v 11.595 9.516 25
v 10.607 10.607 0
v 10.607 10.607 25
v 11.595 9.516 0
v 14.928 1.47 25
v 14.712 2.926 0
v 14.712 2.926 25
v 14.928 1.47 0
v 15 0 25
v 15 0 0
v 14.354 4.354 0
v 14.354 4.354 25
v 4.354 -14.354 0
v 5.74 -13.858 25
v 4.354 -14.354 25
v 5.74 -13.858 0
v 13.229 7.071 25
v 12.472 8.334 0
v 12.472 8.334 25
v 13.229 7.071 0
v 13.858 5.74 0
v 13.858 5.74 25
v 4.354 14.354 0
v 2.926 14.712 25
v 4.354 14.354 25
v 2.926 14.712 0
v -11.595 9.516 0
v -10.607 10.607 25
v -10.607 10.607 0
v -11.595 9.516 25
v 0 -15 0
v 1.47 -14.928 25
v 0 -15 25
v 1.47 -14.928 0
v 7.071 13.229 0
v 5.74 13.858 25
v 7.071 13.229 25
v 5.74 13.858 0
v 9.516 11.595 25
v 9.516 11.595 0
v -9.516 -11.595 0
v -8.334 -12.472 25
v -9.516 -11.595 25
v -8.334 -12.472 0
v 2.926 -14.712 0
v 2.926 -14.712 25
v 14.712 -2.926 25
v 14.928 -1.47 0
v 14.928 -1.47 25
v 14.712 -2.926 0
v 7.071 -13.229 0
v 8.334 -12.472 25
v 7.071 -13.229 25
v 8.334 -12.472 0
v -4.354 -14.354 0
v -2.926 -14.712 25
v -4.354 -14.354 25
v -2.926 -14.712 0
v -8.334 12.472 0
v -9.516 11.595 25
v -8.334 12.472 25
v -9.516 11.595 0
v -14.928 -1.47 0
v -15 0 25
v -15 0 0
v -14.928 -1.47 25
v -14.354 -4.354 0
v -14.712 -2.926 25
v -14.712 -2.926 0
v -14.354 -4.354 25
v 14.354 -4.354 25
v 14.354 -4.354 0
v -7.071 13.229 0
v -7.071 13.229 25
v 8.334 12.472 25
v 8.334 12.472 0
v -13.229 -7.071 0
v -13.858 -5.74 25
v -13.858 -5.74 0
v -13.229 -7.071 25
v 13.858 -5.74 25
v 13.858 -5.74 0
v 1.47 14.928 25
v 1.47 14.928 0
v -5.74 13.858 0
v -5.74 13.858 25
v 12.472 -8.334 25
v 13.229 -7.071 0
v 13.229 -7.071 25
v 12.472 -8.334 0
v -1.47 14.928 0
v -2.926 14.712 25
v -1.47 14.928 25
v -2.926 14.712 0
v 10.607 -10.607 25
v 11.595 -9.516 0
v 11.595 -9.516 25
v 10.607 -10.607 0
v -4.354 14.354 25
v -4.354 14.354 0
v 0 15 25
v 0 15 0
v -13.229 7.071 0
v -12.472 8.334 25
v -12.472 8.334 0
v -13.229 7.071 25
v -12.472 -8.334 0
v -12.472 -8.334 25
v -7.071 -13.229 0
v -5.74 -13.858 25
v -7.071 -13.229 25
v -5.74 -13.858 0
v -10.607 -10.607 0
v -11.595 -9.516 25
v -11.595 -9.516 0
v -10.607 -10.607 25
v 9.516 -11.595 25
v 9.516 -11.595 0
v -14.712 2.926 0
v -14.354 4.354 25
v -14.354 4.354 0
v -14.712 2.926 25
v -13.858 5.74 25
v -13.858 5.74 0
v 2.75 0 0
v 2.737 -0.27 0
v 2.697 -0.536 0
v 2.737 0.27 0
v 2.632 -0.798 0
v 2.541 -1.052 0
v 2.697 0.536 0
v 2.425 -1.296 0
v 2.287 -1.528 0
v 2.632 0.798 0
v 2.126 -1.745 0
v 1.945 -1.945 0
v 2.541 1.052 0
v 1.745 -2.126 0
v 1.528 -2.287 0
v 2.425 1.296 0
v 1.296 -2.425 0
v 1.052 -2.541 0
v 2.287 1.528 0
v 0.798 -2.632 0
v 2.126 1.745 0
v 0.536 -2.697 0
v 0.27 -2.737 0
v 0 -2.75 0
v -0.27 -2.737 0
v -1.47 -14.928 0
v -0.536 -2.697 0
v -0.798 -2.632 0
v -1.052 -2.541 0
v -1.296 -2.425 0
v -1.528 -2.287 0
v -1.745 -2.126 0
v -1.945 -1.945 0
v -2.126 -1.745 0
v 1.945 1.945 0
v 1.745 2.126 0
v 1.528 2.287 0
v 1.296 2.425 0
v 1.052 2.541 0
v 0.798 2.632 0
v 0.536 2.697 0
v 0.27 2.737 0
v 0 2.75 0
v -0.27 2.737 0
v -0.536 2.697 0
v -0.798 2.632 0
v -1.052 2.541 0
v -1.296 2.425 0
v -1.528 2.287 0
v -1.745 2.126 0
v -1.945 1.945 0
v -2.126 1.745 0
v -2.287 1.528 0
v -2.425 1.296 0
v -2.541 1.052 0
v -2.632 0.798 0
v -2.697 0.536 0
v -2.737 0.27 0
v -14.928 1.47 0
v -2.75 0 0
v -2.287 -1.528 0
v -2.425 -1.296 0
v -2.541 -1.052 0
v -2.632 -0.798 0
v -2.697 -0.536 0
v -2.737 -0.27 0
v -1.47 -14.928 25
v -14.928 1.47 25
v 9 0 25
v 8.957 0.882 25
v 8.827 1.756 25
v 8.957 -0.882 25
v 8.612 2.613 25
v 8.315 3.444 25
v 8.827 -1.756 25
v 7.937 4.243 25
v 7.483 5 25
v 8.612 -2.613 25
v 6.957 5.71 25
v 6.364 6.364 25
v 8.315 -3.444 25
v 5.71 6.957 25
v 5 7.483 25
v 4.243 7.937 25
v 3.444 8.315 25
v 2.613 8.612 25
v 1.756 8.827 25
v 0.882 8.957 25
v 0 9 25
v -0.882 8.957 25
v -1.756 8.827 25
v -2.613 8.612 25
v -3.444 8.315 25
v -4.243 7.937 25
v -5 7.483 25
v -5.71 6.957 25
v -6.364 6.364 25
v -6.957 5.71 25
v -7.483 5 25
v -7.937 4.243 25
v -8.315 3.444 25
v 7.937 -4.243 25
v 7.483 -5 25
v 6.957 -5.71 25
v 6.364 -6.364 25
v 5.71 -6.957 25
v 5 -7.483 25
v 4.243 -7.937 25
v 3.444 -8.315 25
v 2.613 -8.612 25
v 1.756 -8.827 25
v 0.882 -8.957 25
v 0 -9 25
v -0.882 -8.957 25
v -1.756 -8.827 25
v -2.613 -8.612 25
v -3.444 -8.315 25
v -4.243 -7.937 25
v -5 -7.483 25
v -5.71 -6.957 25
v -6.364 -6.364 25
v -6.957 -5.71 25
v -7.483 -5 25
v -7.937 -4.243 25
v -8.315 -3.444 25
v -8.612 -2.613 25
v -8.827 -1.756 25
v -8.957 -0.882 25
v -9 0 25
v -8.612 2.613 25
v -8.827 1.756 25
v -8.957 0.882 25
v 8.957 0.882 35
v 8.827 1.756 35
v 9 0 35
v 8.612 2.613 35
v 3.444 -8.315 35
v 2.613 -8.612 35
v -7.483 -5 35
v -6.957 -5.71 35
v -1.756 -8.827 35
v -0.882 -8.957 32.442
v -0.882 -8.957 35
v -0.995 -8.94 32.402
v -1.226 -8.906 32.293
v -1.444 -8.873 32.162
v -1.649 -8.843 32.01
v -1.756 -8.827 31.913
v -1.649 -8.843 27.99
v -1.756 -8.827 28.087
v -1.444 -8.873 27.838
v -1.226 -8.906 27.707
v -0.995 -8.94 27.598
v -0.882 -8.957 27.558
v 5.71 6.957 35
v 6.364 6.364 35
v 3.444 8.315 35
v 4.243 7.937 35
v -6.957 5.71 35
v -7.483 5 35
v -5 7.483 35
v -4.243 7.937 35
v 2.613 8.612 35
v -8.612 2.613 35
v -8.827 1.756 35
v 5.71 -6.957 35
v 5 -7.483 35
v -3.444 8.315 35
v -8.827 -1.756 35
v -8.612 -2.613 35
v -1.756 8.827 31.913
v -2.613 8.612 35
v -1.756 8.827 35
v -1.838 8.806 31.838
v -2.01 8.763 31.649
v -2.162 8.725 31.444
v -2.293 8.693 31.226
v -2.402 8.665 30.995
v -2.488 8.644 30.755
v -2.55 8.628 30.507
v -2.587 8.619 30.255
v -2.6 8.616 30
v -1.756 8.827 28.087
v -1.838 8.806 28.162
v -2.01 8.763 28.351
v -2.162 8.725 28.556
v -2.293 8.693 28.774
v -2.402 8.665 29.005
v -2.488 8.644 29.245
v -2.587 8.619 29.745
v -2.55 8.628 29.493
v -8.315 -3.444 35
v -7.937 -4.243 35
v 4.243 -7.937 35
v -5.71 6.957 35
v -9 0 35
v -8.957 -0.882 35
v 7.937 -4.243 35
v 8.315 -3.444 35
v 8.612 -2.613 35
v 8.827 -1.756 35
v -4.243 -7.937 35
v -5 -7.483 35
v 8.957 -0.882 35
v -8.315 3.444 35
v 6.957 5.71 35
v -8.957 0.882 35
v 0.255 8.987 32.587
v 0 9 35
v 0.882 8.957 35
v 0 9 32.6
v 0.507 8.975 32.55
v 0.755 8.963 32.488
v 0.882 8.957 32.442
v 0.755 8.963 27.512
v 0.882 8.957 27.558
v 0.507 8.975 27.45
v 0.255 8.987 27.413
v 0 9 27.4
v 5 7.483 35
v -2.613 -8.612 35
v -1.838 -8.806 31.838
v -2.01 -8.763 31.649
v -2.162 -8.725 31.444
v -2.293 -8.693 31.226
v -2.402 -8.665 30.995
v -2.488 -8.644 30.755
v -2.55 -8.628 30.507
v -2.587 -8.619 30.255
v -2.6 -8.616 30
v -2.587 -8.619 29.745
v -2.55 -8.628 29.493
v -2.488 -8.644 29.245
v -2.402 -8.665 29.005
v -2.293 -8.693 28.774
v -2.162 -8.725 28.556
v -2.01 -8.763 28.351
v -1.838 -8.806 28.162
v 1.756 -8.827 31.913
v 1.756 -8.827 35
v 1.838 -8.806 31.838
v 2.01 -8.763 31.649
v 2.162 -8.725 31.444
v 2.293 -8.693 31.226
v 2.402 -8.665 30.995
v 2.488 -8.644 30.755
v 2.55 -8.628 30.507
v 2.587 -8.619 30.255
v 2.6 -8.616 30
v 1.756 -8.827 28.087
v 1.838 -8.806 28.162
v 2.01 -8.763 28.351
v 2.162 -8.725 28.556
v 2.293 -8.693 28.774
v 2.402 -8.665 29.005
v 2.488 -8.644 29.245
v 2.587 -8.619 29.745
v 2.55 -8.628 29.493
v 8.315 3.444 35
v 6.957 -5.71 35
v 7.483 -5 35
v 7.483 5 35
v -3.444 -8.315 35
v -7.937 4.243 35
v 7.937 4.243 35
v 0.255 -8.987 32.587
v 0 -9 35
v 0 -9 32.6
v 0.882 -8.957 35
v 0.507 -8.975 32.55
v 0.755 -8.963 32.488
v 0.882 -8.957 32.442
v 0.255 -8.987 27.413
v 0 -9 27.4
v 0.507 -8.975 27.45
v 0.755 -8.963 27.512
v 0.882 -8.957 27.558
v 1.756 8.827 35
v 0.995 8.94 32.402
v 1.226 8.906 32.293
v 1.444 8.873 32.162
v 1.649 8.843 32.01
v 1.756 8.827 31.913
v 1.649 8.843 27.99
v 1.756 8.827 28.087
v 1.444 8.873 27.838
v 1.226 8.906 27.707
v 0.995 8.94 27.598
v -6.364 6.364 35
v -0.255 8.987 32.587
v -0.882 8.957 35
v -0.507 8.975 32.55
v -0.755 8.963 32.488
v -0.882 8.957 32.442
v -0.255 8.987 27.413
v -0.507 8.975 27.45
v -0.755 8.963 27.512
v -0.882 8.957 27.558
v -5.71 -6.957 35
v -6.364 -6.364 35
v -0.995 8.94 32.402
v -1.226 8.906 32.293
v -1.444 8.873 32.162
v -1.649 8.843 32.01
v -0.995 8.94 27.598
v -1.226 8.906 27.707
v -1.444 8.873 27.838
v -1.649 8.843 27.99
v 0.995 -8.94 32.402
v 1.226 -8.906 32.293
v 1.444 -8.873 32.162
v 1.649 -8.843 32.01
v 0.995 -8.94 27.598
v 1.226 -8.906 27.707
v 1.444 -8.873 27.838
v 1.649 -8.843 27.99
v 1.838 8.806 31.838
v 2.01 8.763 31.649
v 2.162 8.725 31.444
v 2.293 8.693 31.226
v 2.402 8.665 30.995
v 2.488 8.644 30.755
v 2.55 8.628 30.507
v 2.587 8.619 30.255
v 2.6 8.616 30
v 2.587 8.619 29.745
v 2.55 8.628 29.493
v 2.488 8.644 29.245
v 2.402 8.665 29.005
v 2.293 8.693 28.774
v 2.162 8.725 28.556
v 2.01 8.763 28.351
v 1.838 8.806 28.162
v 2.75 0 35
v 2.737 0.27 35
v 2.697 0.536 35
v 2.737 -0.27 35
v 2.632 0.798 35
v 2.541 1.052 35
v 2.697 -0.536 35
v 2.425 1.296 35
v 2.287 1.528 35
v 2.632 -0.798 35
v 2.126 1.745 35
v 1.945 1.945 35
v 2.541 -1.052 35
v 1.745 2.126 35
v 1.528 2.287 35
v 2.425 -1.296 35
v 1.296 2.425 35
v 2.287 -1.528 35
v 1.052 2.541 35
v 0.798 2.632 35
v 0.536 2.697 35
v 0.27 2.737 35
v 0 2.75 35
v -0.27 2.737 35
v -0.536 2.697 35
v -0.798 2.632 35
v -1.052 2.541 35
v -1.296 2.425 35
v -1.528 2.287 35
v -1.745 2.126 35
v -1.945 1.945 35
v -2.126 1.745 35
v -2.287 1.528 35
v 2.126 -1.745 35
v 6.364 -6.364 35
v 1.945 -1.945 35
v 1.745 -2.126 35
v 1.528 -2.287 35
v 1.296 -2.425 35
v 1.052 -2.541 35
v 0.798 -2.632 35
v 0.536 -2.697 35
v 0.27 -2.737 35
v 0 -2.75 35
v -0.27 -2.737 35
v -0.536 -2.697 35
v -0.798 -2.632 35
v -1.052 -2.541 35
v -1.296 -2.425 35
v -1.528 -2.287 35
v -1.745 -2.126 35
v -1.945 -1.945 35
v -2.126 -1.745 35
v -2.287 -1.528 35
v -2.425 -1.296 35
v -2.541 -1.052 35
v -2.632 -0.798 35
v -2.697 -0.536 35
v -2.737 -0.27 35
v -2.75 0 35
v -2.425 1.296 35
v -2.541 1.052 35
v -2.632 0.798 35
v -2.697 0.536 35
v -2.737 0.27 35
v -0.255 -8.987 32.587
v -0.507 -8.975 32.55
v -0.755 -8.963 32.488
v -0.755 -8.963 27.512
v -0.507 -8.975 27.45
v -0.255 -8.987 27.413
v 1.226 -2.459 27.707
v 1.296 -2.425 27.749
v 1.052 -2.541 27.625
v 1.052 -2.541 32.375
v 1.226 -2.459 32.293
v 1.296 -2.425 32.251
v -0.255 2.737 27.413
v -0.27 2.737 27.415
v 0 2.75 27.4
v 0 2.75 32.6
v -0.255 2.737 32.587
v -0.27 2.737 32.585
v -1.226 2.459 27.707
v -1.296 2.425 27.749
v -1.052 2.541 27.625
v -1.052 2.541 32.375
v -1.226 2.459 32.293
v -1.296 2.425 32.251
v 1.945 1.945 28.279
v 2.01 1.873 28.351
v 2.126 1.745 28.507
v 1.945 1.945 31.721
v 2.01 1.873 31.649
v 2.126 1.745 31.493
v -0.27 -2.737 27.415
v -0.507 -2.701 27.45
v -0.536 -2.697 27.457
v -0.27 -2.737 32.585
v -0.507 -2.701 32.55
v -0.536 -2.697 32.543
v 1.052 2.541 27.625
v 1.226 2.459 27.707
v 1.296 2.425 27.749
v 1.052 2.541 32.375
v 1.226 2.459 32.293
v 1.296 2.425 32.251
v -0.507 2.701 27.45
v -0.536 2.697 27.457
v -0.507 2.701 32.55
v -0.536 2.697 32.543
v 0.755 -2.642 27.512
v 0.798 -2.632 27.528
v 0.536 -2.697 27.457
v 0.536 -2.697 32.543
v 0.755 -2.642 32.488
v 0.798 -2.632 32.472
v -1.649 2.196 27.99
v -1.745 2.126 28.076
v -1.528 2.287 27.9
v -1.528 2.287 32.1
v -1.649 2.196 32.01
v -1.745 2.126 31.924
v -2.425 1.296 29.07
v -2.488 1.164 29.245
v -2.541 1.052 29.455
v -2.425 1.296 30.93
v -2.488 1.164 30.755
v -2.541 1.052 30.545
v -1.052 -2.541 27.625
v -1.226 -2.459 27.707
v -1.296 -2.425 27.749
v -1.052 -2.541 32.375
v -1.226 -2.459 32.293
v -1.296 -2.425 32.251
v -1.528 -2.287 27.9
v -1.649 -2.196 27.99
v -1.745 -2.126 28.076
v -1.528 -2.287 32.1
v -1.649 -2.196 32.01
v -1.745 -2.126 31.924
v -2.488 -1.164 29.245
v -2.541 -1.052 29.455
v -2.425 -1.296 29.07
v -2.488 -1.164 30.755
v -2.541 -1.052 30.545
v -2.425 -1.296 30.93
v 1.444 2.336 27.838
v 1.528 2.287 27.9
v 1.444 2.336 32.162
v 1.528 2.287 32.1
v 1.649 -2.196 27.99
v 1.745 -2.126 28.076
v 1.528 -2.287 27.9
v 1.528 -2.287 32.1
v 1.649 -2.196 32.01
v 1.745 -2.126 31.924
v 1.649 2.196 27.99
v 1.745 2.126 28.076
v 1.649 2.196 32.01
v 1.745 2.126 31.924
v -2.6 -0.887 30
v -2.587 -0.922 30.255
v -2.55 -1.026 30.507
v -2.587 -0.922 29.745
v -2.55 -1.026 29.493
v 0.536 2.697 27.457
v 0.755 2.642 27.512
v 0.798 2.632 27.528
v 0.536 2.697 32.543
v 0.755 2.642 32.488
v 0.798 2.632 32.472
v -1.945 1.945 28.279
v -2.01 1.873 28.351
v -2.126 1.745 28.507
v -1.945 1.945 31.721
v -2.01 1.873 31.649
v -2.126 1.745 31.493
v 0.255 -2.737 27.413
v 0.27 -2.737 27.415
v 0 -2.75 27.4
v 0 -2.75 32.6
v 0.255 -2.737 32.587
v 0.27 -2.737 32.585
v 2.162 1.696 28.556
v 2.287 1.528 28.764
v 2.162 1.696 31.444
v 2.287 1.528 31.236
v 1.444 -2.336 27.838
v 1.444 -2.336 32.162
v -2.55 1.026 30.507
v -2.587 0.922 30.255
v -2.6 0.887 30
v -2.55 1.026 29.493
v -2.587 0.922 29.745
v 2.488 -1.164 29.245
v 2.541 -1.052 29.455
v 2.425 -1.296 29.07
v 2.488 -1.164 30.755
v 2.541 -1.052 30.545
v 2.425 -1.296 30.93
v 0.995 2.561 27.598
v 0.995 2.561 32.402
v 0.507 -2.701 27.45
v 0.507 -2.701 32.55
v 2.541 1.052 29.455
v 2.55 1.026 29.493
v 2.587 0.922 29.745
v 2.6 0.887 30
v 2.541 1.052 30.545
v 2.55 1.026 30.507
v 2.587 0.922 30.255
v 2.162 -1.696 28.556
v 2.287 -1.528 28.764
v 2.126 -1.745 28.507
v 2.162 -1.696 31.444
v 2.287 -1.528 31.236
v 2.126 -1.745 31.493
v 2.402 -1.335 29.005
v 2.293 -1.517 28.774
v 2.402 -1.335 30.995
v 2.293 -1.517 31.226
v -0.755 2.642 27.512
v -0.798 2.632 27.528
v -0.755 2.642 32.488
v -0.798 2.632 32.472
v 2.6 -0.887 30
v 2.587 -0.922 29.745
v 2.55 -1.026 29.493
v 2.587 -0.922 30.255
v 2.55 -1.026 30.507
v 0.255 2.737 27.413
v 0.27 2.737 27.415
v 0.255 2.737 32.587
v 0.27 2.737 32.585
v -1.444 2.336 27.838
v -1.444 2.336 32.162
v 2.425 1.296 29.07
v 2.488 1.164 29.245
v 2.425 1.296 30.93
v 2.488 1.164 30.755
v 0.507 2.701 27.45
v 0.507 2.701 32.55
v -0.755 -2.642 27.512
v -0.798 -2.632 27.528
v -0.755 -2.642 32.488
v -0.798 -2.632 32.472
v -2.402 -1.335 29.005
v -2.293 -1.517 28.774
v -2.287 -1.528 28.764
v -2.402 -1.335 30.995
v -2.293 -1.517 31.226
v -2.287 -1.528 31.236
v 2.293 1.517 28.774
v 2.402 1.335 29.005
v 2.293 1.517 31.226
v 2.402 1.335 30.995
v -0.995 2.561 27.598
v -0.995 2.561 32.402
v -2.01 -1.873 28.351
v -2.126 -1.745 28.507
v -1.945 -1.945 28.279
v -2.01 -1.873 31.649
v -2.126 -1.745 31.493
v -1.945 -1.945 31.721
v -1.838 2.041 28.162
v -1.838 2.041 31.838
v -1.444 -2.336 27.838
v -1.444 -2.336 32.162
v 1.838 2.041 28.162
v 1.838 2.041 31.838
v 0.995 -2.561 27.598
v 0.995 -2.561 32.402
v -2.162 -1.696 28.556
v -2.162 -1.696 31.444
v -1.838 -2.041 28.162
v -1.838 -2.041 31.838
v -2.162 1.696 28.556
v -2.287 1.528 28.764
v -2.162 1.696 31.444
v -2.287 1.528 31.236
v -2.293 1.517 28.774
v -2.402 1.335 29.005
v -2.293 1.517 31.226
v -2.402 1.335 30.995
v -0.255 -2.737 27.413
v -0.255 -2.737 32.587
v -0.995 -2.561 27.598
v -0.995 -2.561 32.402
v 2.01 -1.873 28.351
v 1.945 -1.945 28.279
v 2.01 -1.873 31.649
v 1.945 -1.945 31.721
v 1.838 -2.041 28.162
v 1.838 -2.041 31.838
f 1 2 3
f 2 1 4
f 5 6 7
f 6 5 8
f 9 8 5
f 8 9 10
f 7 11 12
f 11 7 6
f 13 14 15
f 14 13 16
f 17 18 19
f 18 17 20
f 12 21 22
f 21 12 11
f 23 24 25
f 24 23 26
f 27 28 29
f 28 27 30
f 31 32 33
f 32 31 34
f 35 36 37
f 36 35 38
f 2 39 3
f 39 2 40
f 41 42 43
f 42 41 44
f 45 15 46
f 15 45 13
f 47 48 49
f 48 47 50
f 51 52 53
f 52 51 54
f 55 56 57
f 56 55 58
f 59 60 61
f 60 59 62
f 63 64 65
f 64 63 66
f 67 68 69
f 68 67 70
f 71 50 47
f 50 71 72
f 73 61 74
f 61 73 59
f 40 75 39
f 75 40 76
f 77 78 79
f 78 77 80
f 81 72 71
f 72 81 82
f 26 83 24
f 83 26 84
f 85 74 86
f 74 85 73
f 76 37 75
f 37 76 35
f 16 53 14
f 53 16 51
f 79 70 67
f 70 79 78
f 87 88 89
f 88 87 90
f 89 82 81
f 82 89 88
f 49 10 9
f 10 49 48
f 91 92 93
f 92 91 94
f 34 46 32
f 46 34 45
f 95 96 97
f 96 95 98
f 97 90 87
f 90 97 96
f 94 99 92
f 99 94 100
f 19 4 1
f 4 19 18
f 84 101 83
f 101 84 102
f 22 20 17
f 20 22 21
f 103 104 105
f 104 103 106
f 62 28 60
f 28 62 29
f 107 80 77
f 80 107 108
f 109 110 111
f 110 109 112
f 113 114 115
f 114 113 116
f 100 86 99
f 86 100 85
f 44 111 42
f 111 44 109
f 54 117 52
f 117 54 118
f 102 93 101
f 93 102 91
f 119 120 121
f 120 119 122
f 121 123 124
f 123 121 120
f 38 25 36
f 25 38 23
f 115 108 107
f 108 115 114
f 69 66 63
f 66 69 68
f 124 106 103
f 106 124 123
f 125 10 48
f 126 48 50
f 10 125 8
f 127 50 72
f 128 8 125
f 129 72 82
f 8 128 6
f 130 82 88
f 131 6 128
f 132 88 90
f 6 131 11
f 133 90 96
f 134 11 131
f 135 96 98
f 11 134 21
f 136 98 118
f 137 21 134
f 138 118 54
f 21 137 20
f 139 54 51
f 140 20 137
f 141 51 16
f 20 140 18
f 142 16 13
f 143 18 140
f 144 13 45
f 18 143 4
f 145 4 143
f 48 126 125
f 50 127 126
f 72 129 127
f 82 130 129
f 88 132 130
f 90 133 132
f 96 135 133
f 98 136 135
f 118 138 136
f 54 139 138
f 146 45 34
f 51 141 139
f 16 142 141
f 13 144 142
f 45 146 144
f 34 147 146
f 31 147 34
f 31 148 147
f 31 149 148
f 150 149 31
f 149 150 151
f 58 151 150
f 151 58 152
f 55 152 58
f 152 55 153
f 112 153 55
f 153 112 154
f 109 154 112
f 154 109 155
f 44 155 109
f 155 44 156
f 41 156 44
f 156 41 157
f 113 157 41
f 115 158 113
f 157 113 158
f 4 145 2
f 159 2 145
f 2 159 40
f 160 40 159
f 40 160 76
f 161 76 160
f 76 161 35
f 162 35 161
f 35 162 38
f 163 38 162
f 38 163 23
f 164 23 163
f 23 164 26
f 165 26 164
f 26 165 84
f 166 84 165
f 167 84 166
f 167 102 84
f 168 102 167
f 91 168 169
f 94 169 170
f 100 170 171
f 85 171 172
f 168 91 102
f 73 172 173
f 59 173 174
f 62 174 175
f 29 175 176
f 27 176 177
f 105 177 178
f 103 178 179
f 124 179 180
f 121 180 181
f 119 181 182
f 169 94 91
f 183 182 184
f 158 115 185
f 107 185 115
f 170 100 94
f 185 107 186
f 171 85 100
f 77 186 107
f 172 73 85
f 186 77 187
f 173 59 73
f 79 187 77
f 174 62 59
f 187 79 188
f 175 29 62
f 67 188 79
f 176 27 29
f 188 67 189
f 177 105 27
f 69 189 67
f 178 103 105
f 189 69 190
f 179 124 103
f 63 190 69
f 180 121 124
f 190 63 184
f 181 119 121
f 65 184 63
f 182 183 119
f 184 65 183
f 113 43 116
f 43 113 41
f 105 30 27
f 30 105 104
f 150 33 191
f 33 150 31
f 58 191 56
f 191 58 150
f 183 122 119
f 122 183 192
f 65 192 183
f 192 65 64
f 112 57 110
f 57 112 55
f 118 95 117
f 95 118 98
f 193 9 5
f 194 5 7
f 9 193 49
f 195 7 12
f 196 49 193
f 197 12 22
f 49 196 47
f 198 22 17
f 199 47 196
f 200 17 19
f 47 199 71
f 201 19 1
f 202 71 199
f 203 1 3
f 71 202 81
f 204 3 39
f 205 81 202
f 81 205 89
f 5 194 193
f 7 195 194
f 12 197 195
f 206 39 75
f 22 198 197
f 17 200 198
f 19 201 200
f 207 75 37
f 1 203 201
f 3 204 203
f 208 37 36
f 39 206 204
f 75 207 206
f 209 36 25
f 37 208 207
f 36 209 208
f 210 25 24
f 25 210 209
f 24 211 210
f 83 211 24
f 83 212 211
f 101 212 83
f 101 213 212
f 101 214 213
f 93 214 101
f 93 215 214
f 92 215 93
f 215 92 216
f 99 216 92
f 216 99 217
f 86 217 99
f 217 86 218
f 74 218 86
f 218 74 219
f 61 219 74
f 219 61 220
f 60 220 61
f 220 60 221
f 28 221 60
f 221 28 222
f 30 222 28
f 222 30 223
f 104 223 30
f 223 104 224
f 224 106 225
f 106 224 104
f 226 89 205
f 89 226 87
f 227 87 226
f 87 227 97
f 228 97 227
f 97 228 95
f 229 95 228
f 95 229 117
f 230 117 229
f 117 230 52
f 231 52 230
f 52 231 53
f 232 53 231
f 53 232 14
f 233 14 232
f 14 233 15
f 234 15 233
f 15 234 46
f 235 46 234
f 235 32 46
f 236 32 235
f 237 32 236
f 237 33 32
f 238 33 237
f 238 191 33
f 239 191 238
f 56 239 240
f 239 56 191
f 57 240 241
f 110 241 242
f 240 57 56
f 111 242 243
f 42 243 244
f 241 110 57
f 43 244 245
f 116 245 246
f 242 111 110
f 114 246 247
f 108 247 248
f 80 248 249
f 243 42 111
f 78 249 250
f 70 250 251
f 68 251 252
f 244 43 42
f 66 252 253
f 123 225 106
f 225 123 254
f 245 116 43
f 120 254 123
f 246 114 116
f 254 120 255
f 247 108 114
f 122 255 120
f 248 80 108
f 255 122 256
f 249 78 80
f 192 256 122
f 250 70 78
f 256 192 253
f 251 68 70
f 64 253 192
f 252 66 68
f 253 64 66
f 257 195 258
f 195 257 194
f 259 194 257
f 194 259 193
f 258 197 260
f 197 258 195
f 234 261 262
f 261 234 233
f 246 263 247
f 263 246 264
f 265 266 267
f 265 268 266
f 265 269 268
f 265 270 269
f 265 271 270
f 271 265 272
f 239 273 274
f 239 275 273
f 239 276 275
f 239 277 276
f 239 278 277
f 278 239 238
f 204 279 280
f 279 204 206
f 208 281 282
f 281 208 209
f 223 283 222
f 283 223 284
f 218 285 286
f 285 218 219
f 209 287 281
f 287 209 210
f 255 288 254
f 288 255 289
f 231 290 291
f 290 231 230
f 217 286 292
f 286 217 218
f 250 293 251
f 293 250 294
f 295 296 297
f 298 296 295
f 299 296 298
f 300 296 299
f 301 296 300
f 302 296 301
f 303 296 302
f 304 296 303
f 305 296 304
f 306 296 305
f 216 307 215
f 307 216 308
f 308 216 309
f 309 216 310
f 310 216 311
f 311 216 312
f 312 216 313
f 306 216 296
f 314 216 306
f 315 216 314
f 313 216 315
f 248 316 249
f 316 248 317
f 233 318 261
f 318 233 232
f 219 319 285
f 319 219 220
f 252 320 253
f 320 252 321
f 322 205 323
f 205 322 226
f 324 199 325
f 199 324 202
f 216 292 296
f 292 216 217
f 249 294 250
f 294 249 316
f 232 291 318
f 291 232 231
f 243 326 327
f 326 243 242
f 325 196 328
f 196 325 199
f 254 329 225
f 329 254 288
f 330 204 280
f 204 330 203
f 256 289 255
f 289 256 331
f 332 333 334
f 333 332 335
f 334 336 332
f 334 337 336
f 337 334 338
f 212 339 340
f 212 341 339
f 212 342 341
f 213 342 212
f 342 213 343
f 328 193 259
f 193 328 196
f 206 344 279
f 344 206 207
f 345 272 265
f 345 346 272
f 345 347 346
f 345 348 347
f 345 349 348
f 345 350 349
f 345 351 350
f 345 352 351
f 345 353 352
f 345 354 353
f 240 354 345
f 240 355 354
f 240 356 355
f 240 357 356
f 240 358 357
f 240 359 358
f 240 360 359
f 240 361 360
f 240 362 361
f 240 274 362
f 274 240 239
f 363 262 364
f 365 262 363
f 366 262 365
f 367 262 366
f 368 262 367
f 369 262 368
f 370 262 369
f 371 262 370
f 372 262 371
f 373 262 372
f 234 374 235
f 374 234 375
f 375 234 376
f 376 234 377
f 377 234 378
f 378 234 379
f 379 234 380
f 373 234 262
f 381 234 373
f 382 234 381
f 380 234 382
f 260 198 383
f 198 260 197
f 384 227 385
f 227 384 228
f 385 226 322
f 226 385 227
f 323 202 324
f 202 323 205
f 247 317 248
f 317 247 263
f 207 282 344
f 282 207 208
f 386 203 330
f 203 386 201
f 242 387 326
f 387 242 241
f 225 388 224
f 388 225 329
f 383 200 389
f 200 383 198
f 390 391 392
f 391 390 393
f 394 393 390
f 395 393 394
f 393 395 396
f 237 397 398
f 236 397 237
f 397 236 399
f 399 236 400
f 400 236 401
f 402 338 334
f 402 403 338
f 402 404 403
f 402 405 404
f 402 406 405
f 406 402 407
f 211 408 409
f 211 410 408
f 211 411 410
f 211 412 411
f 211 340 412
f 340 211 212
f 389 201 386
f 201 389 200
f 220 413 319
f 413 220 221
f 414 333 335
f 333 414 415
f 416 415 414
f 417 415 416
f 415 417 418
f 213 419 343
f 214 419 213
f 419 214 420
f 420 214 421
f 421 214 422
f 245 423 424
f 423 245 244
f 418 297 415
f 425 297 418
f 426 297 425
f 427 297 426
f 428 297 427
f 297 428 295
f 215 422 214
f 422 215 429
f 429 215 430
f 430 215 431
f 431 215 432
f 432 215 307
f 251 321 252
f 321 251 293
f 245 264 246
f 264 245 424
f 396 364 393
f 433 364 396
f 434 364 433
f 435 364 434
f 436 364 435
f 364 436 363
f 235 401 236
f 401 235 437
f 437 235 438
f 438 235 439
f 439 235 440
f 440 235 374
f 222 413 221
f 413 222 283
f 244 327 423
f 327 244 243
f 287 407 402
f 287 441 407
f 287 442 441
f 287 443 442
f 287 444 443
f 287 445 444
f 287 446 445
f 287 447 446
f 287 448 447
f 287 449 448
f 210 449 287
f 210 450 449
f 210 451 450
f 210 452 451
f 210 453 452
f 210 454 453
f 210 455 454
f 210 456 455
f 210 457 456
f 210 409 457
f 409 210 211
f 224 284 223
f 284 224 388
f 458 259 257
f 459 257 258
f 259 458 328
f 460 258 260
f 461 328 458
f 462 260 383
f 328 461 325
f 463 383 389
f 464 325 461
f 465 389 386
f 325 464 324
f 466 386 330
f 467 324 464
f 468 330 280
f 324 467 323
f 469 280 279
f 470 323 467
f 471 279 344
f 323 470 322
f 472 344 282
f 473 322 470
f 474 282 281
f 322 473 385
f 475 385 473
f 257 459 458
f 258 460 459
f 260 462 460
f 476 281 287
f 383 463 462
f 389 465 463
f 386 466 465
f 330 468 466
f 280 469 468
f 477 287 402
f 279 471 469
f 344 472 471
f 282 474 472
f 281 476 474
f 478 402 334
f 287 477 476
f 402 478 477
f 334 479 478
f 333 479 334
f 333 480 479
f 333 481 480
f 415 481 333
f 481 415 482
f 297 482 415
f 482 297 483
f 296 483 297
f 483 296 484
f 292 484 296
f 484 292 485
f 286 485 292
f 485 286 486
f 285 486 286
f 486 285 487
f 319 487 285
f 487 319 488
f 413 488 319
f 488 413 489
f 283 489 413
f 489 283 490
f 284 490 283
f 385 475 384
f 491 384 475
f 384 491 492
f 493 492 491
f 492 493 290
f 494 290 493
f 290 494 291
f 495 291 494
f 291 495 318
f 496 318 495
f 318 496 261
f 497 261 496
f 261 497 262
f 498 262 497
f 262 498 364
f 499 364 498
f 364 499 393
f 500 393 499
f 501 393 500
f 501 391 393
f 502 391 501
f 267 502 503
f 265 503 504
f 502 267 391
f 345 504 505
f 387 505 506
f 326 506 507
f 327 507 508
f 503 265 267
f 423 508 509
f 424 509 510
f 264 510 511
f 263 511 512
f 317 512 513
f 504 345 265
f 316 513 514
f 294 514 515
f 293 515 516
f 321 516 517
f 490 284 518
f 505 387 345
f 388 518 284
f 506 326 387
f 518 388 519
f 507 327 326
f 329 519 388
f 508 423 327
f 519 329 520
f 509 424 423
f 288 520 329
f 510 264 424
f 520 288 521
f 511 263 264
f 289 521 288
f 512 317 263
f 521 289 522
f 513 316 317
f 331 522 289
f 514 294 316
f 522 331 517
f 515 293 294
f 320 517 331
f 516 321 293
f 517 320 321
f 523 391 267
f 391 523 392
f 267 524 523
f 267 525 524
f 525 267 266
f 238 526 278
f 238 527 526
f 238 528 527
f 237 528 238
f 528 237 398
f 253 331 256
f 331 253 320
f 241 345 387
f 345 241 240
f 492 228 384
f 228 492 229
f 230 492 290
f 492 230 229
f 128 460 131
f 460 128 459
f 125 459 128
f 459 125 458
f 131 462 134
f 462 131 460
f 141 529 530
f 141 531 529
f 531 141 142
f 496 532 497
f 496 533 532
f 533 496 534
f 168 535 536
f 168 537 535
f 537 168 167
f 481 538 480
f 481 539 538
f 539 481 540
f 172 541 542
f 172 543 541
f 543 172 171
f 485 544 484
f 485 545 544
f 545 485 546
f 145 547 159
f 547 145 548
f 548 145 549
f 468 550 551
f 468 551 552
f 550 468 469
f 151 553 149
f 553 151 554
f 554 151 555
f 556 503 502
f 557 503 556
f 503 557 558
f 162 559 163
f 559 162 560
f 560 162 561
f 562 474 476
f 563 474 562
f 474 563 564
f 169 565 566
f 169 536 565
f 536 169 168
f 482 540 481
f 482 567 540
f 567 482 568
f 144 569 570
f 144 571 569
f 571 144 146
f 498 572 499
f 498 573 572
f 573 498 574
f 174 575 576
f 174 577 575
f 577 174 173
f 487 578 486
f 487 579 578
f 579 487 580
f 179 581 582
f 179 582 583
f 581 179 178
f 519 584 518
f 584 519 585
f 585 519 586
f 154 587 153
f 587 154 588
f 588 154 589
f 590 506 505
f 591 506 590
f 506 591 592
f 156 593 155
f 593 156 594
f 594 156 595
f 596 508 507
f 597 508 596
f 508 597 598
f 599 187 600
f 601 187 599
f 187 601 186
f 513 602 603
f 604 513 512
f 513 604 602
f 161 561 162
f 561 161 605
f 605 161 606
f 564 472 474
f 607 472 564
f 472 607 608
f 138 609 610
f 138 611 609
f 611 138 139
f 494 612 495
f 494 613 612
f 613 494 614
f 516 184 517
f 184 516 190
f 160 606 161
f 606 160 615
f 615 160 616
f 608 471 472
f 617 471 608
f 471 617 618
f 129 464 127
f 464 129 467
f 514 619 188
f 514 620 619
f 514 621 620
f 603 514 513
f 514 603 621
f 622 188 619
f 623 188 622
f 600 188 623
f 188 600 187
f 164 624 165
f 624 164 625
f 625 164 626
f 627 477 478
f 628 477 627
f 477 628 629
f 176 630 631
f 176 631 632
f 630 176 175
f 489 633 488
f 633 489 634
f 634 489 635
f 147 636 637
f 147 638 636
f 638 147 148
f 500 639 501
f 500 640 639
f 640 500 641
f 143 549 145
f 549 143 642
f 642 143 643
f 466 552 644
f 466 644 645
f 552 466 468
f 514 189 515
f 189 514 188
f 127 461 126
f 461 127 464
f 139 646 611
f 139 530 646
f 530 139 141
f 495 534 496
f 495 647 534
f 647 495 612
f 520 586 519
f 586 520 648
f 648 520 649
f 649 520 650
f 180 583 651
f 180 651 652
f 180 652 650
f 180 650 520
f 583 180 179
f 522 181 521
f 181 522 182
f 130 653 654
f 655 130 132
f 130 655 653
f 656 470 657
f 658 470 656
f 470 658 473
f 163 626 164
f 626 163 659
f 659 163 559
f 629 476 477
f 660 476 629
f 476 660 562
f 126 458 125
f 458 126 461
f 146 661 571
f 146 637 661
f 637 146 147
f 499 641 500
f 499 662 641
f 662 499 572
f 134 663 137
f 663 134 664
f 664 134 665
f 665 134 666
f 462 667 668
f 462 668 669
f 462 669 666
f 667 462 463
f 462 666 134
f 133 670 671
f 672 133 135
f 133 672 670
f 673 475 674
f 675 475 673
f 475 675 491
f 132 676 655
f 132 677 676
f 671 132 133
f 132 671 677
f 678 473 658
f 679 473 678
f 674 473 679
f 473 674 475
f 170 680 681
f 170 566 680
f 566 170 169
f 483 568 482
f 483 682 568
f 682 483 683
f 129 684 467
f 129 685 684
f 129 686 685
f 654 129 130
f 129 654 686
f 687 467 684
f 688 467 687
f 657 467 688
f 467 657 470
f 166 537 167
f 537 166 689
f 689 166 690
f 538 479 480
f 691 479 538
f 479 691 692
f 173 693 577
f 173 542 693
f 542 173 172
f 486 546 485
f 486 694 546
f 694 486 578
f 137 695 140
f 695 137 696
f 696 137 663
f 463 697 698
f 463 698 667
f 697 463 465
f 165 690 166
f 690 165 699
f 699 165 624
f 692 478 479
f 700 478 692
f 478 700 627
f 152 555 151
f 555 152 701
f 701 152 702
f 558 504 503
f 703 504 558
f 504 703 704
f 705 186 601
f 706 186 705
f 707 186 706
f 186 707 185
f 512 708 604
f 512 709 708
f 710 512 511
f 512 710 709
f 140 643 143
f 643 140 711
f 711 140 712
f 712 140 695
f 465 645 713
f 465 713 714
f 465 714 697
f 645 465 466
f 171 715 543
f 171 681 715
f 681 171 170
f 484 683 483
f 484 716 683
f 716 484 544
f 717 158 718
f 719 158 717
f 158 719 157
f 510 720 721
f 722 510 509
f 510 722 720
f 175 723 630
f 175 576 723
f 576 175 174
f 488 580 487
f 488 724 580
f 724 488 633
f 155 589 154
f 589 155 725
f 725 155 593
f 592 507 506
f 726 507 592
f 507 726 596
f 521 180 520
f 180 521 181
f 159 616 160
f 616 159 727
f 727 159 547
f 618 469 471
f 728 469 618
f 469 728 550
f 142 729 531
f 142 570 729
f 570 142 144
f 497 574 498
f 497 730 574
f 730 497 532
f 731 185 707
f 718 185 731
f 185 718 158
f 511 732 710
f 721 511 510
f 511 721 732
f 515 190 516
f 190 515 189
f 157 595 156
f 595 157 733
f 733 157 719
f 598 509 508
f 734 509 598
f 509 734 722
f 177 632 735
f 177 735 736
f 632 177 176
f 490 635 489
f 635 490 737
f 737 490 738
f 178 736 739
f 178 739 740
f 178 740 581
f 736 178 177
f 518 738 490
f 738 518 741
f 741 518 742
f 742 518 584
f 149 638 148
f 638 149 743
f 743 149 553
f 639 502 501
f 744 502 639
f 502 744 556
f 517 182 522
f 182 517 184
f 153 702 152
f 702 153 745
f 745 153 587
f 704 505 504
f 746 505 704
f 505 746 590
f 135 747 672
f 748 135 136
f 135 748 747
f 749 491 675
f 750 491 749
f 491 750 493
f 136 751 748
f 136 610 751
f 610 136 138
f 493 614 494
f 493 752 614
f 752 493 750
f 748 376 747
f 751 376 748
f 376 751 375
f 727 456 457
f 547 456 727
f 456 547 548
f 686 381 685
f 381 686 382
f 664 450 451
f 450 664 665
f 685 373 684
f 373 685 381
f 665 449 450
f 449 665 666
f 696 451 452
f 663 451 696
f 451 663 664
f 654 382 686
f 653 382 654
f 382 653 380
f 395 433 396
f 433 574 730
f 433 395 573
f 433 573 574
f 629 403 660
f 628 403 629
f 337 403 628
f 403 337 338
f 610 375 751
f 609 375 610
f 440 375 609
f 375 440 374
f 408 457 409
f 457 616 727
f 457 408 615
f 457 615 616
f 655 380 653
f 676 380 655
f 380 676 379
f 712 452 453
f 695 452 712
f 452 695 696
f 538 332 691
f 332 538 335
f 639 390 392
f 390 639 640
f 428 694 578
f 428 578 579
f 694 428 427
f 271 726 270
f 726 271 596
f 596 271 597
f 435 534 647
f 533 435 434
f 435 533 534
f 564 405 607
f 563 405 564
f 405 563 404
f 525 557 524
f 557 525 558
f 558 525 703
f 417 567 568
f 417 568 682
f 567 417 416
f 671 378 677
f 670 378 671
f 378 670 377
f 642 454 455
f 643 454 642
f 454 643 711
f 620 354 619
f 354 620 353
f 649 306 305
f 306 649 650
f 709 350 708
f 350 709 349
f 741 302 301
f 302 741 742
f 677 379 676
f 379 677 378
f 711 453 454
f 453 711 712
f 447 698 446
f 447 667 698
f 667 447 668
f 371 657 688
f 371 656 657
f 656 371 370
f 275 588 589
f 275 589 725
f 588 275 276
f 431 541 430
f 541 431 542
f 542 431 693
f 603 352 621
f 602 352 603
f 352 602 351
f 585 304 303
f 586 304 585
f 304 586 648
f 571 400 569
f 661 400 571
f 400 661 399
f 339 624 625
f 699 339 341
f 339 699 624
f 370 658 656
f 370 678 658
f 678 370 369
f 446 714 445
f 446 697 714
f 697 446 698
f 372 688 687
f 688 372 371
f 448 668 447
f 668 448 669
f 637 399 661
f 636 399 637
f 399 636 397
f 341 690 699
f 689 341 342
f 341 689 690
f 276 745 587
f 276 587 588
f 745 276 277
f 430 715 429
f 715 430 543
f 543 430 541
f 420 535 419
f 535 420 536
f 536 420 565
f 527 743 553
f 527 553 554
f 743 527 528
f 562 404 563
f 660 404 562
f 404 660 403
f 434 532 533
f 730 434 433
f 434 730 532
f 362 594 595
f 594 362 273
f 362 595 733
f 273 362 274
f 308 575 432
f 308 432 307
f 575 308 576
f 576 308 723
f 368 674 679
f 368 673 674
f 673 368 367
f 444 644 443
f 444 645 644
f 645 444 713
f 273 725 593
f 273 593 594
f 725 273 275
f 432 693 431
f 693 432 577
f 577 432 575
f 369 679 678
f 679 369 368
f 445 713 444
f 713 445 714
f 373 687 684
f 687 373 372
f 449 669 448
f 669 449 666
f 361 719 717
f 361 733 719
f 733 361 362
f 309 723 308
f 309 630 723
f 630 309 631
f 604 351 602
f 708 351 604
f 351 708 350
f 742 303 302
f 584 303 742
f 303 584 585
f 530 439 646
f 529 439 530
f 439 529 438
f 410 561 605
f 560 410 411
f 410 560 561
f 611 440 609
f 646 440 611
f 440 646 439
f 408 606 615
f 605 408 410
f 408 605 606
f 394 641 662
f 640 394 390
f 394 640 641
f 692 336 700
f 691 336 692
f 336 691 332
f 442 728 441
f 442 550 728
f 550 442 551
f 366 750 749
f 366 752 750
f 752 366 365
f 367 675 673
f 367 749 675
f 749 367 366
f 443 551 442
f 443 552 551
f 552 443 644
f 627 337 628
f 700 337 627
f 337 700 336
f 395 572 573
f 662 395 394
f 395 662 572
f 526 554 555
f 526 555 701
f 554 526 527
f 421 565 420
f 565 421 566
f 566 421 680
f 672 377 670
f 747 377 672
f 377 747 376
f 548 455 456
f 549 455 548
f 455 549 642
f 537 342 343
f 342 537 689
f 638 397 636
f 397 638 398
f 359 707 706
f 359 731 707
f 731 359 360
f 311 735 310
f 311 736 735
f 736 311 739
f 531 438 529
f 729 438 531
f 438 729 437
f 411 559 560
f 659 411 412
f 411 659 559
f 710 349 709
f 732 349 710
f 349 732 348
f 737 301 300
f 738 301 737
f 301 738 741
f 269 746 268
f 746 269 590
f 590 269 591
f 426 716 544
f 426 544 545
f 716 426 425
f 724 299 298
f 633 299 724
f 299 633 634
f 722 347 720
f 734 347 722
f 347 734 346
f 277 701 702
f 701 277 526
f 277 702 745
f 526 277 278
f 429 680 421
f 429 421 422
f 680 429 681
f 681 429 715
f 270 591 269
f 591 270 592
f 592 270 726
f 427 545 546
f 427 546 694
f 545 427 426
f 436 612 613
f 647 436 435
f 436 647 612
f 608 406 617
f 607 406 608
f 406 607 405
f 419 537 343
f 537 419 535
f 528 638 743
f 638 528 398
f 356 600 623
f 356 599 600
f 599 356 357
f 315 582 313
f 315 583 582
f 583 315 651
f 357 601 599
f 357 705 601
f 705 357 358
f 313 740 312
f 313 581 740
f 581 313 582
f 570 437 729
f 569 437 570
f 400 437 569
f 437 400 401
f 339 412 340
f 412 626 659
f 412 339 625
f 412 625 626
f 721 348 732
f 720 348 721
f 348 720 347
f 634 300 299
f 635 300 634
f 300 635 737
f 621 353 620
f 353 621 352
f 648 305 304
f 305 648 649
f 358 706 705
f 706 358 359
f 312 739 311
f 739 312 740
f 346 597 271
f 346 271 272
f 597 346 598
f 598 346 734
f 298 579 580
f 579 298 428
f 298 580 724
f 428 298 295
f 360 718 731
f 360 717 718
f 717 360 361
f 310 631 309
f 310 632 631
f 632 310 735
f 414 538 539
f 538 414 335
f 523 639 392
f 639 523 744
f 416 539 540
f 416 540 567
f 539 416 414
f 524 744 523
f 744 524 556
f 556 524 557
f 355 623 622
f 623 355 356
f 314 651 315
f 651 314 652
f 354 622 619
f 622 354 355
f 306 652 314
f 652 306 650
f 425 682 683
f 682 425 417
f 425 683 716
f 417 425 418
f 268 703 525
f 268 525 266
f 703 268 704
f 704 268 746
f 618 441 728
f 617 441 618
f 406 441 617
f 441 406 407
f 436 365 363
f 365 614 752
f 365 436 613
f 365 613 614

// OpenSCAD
// Stepper motor friction wheel for paper tape punch designed in OpenScad.
// Name: paper_feed_wheel.scad
// Fits a NEMA-17 stepper motor
// Lars Silen 2024
// This is free software without any warranties.
// Feel free to use and modify.
// 
// Howto use:
// Install openScad
// Create a directory for this project called for example OpenScad/paper_tape_punch/
// Copy this file into the directory.
// Start OpenScad and load this file File/OpenFile/paper_feed_wheel.scad
// Display the part using the Menu  Design/Preview
// Do changes and Preview until the design fits your needs.
// Generate a stl-file for printing using Design/Render . Make sure that
// the stl-file is stored in the correct directory. 

module base(){
  cylinder(r=15,h=25,$fn=64);
  cylinder(r=9,h=35,$fn=64);  
}


difference(){
  base();
  cylinder(r=2.75,h=40,$fn=64);
  translate([0,-12,30])rotate([-90,0,0])cylinder(r=2.6,h=40,$fn=64);  
}
